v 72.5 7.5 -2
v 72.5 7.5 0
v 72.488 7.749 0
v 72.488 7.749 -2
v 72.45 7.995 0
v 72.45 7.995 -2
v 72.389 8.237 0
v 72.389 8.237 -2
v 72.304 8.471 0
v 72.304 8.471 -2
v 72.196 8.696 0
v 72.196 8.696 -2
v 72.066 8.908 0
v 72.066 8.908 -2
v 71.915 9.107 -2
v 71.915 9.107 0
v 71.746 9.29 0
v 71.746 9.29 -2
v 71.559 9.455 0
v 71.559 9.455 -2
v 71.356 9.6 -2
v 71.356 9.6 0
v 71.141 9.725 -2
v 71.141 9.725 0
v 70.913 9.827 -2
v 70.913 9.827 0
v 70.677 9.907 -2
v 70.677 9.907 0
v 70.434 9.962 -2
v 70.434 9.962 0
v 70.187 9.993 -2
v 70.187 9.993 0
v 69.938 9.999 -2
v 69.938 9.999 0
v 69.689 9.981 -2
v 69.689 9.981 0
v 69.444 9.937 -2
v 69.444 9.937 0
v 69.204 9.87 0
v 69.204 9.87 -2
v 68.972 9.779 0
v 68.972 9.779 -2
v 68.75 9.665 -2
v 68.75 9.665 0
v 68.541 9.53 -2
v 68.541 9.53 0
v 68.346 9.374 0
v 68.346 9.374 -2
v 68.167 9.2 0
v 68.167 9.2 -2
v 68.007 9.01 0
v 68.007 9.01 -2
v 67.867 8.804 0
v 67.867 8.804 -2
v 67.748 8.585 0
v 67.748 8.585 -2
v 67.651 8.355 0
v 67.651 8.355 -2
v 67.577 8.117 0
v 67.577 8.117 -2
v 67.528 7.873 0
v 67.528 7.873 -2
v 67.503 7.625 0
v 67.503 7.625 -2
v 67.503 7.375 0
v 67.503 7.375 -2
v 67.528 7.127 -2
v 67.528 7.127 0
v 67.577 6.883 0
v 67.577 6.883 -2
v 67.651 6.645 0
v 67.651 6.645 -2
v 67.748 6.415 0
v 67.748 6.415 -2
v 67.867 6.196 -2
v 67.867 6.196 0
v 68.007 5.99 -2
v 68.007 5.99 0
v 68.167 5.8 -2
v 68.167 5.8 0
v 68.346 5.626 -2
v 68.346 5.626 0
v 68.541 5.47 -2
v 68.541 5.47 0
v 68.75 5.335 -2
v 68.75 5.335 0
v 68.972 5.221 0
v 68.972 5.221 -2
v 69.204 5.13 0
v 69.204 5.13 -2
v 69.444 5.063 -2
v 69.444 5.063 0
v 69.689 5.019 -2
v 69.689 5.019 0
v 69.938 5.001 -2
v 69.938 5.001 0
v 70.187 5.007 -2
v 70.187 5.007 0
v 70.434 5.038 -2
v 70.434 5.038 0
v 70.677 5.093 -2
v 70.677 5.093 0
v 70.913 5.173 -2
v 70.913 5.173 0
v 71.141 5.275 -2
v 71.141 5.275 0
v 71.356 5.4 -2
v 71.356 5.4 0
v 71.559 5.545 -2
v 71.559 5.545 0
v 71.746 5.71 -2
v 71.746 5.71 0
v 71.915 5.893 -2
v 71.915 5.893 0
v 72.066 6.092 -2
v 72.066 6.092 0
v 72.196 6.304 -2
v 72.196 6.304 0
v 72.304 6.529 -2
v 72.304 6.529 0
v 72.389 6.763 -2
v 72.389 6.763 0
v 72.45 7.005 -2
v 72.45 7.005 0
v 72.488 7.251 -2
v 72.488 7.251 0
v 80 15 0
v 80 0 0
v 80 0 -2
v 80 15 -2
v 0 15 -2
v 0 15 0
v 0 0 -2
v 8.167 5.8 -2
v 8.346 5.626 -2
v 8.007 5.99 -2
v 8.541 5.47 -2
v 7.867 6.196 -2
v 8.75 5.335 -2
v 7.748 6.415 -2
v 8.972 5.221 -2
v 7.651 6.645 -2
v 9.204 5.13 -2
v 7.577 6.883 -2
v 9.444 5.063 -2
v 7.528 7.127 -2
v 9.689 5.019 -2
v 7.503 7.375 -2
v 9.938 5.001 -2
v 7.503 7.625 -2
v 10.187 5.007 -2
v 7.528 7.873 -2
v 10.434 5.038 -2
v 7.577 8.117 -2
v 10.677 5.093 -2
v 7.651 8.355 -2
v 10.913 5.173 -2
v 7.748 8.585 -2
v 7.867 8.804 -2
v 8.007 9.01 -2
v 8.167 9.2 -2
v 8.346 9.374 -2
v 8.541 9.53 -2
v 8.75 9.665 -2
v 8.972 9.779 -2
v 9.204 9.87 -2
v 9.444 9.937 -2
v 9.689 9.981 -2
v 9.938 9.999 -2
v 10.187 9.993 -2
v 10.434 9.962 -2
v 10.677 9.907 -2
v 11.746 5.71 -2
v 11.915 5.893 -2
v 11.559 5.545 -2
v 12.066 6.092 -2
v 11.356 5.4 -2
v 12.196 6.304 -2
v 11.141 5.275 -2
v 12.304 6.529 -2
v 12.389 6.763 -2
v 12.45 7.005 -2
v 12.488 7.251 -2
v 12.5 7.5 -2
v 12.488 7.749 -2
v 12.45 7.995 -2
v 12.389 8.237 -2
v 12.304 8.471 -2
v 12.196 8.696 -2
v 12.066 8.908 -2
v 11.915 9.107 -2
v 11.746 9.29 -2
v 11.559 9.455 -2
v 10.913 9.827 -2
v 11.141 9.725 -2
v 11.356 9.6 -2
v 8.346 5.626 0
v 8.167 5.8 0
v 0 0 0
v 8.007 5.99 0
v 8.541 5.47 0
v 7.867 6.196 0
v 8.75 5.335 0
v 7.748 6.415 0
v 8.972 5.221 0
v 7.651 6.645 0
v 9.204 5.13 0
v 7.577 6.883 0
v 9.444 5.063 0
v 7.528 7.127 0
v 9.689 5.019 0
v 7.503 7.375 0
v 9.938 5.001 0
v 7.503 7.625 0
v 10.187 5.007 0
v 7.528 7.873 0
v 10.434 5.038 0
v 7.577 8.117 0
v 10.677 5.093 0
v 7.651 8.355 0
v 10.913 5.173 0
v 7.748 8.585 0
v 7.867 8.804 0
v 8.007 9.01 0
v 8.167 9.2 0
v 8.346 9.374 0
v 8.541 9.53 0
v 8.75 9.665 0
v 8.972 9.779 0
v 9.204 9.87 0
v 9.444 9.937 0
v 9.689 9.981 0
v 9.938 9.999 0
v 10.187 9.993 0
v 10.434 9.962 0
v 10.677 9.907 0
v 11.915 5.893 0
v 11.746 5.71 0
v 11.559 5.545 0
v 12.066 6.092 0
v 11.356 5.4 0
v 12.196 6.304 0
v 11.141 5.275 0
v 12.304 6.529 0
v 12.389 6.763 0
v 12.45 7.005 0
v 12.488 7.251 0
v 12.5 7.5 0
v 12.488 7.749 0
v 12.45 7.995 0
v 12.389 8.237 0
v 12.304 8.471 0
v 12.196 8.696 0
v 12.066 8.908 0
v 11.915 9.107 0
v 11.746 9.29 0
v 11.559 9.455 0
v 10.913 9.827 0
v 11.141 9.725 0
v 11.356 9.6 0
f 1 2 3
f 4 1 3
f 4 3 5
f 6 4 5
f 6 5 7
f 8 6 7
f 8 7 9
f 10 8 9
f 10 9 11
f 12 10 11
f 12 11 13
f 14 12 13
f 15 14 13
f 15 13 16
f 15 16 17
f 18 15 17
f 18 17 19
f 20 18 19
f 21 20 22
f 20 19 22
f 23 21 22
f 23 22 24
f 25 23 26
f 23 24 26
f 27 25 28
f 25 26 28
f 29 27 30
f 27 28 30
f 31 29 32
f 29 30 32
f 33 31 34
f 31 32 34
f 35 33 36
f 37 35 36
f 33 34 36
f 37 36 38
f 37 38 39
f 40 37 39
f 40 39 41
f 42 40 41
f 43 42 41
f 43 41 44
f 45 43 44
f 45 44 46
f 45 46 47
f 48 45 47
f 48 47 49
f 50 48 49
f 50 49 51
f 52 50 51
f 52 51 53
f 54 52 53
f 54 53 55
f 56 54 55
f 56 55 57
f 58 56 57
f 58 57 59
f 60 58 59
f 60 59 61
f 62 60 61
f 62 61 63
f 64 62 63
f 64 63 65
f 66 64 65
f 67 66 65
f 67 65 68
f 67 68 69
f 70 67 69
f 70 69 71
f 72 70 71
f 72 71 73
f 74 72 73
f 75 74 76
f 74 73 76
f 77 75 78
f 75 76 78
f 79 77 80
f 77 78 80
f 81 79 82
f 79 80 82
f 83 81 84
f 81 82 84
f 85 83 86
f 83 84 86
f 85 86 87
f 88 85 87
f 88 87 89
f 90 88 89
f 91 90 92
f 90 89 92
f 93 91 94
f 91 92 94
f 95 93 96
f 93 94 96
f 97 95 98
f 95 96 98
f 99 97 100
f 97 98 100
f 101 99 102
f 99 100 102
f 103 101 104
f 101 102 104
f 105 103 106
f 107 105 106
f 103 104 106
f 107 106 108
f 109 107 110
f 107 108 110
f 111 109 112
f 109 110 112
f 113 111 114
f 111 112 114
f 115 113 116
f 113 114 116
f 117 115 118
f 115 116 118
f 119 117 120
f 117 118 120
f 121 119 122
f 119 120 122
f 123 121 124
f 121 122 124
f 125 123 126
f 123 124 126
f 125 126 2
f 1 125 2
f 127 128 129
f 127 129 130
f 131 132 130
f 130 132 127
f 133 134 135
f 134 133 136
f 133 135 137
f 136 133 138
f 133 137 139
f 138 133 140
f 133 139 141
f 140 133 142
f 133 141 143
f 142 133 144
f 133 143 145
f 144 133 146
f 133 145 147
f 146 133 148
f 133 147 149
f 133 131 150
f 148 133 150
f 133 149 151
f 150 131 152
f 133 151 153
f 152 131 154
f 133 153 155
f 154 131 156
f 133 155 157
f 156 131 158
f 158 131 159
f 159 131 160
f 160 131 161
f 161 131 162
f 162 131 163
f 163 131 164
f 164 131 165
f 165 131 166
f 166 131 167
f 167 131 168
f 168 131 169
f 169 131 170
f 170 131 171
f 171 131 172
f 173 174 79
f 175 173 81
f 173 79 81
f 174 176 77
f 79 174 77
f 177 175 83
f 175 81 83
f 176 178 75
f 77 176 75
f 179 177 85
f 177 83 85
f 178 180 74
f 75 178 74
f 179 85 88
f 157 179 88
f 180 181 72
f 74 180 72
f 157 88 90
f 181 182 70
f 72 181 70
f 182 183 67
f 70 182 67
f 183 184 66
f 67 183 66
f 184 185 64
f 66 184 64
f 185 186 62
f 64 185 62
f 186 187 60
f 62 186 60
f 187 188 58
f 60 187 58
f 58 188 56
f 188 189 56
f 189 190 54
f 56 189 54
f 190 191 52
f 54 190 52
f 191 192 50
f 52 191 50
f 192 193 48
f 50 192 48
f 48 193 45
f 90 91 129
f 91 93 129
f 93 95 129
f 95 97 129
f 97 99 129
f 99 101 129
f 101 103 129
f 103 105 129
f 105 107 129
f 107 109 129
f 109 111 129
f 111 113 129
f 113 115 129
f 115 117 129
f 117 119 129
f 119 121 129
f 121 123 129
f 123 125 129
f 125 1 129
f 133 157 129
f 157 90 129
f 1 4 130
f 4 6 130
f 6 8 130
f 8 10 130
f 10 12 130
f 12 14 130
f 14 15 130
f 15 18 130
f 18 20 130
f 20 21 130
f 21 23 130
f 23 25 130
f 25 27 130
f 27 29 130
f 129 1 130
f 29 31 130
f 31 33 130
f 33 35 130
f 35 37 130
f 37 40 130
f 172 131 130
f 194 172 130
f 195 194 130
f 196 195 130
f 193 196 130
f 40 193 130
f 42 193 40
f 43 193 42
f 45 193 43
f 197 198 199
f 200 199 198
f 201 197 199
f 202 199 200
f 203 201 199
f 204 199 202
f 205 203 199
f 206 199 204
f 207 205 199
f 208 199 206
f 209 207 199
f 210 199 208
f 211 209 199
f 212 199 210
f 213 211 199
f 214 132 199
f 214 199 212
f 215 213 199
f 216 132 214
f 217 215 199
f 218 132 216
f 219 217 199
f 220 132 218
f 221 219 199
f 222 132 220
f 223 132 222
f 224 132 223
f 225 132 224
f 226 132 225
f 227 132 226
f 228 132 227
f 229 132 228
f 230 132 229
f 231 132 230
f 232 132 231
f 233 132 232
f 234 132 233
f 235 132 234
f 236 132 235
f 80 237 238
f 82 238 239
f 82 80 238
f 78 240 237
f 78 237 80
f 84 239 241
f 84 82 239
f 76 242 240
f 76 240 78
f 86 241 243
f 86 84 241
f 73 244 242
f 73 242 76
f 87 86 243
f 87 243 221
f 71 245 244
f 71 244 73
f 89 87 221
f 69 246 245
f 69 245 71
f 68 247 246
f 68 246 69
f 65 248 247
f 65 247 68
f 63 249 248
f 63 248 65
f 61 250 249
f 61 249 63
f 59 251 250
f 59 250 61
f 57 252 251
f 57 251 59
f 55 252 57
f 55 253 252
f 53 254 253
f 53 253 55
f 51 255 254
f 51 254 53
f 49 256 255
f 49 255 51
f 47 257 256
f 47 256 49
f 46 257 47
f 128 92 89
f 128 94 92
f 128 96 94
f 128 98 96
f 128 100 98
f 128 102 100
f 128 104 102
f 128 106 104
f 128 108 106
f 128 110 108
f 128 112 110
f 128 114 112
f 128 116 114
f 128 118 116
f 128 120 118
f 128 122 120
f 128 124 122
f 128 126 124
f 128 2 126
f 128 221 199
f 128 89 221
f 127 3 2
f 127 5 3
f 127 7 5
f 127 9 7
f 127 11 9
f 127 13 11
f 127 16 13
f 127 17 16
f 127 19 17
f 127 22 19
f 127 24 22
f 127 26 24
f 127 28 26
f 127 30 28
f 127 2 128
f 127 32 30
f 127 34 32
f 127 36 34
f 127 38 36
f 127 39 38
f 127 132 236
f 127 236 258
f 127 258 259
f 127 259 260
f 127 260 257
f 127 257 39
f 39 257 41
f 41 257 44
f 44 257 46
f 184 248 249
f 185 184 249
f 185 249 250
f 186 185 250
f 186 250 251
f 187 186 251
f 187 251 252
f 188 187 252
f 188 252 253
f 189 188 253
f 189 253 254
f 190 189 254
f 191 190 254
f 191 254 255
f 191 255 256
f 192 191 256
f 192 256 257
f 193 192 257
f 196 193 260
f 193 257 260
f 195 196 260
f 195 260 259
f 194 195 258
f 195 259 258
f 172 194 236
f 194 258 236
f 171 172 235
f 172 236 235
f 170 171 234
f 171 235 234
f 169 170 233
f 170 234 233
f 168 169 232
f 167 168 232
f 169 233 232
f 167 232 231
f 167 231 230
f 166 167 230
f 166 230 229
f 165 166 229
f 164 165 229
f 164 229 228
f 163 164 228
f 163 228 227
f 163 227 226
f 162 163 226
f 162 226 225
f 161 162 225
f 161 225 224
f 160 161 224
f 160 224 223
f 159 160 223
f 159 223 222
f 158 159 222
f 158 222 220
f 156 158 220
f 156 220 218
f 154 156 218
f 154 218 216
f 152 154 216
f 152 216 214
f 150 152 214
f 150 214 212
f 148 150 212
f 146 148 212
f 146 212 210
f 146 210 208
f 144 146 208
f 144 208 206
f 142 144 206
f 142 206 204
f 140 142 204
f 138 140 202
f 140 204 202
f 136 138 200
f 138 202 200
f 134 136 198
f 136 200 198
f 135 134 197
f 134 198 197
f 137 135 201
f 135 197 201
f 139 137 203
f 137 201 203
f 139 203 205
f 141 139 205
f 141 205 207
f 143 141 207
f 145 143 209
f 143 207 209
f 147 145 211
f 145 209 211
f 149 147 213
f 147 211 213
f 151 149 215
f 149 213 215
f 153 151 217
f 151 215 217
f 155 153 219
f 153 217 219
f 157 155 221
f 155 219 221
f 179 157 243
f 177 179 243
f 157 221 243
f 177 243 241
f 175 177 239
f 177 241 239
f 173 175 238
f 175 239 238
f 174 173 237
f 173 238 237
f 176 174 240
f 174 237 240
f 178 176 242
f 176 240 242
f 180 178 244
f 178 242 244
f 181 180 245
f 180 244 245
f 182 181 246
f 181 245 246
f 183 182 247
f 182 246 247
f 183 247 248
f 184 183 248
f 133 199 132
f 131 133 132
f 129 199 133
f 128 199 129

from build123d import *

# Parameters (mm, degrees)
SKETCH1_W          = 80
SKETCH1_H          = 15
BASE_FLANGE1_DEPTH = 2
CUT_EXTRUDE1_REACH = 83.419
SKETCH6_R          = 2.5


# Sheet-metal steps are written as plain solids
with BuildPart() as part:
    # Sketch1 → Base-Flange1 (new body)
    with BuildSketch(Plane.XY):
        with Locations((40, 7.5)):
            Rectangle(SKETCH1_W, SKETCH1_H)
    extrude(amount=-BASE_FLANGE1_DEPTH)

    # Sketch6 → Cut-Extrude1 (cut, up to next)
    with BuildSketch(Plane.XY, mode=Mode.PRIVATE) as cut_extrude1_sk1:
        with Locations((10, 7.5)):
            Circle(SKETCH6_R)
    cut_extrude1_tool1 = extrude(cut_extrude1_sk1.sketch, amount=-CUT_EXTRUDE1_REACH, mode=Mode.PRIVATE) & part.part
    # Sketch6 → Cut-Extrude1 (cut, up to next)
    with BuildSketch(Plane.XY, mode=Mode.PRIVATE) as cut_extrude1_sk2:
        with Locations((70, 7.5)):
            Circle(SKETCH6_R)
    cut_extrude1_tool2 = extrude(cut_extrude1_sk2.sketch, amount=-CUT_EXTRUDE1_REACH, mode=Mode.PRIVATE) & part.part
    add(cut_extrude1_tool1.solids().sort_by_distance((10, 7.5, 0))[0], mode=Mode.SUBTRACT)
    add(cut_extrude1_tool2.solids().sort_by_distance((70, 7.5, 0))[0], mode=Mode.SUBTRACT)


solid = part.part
